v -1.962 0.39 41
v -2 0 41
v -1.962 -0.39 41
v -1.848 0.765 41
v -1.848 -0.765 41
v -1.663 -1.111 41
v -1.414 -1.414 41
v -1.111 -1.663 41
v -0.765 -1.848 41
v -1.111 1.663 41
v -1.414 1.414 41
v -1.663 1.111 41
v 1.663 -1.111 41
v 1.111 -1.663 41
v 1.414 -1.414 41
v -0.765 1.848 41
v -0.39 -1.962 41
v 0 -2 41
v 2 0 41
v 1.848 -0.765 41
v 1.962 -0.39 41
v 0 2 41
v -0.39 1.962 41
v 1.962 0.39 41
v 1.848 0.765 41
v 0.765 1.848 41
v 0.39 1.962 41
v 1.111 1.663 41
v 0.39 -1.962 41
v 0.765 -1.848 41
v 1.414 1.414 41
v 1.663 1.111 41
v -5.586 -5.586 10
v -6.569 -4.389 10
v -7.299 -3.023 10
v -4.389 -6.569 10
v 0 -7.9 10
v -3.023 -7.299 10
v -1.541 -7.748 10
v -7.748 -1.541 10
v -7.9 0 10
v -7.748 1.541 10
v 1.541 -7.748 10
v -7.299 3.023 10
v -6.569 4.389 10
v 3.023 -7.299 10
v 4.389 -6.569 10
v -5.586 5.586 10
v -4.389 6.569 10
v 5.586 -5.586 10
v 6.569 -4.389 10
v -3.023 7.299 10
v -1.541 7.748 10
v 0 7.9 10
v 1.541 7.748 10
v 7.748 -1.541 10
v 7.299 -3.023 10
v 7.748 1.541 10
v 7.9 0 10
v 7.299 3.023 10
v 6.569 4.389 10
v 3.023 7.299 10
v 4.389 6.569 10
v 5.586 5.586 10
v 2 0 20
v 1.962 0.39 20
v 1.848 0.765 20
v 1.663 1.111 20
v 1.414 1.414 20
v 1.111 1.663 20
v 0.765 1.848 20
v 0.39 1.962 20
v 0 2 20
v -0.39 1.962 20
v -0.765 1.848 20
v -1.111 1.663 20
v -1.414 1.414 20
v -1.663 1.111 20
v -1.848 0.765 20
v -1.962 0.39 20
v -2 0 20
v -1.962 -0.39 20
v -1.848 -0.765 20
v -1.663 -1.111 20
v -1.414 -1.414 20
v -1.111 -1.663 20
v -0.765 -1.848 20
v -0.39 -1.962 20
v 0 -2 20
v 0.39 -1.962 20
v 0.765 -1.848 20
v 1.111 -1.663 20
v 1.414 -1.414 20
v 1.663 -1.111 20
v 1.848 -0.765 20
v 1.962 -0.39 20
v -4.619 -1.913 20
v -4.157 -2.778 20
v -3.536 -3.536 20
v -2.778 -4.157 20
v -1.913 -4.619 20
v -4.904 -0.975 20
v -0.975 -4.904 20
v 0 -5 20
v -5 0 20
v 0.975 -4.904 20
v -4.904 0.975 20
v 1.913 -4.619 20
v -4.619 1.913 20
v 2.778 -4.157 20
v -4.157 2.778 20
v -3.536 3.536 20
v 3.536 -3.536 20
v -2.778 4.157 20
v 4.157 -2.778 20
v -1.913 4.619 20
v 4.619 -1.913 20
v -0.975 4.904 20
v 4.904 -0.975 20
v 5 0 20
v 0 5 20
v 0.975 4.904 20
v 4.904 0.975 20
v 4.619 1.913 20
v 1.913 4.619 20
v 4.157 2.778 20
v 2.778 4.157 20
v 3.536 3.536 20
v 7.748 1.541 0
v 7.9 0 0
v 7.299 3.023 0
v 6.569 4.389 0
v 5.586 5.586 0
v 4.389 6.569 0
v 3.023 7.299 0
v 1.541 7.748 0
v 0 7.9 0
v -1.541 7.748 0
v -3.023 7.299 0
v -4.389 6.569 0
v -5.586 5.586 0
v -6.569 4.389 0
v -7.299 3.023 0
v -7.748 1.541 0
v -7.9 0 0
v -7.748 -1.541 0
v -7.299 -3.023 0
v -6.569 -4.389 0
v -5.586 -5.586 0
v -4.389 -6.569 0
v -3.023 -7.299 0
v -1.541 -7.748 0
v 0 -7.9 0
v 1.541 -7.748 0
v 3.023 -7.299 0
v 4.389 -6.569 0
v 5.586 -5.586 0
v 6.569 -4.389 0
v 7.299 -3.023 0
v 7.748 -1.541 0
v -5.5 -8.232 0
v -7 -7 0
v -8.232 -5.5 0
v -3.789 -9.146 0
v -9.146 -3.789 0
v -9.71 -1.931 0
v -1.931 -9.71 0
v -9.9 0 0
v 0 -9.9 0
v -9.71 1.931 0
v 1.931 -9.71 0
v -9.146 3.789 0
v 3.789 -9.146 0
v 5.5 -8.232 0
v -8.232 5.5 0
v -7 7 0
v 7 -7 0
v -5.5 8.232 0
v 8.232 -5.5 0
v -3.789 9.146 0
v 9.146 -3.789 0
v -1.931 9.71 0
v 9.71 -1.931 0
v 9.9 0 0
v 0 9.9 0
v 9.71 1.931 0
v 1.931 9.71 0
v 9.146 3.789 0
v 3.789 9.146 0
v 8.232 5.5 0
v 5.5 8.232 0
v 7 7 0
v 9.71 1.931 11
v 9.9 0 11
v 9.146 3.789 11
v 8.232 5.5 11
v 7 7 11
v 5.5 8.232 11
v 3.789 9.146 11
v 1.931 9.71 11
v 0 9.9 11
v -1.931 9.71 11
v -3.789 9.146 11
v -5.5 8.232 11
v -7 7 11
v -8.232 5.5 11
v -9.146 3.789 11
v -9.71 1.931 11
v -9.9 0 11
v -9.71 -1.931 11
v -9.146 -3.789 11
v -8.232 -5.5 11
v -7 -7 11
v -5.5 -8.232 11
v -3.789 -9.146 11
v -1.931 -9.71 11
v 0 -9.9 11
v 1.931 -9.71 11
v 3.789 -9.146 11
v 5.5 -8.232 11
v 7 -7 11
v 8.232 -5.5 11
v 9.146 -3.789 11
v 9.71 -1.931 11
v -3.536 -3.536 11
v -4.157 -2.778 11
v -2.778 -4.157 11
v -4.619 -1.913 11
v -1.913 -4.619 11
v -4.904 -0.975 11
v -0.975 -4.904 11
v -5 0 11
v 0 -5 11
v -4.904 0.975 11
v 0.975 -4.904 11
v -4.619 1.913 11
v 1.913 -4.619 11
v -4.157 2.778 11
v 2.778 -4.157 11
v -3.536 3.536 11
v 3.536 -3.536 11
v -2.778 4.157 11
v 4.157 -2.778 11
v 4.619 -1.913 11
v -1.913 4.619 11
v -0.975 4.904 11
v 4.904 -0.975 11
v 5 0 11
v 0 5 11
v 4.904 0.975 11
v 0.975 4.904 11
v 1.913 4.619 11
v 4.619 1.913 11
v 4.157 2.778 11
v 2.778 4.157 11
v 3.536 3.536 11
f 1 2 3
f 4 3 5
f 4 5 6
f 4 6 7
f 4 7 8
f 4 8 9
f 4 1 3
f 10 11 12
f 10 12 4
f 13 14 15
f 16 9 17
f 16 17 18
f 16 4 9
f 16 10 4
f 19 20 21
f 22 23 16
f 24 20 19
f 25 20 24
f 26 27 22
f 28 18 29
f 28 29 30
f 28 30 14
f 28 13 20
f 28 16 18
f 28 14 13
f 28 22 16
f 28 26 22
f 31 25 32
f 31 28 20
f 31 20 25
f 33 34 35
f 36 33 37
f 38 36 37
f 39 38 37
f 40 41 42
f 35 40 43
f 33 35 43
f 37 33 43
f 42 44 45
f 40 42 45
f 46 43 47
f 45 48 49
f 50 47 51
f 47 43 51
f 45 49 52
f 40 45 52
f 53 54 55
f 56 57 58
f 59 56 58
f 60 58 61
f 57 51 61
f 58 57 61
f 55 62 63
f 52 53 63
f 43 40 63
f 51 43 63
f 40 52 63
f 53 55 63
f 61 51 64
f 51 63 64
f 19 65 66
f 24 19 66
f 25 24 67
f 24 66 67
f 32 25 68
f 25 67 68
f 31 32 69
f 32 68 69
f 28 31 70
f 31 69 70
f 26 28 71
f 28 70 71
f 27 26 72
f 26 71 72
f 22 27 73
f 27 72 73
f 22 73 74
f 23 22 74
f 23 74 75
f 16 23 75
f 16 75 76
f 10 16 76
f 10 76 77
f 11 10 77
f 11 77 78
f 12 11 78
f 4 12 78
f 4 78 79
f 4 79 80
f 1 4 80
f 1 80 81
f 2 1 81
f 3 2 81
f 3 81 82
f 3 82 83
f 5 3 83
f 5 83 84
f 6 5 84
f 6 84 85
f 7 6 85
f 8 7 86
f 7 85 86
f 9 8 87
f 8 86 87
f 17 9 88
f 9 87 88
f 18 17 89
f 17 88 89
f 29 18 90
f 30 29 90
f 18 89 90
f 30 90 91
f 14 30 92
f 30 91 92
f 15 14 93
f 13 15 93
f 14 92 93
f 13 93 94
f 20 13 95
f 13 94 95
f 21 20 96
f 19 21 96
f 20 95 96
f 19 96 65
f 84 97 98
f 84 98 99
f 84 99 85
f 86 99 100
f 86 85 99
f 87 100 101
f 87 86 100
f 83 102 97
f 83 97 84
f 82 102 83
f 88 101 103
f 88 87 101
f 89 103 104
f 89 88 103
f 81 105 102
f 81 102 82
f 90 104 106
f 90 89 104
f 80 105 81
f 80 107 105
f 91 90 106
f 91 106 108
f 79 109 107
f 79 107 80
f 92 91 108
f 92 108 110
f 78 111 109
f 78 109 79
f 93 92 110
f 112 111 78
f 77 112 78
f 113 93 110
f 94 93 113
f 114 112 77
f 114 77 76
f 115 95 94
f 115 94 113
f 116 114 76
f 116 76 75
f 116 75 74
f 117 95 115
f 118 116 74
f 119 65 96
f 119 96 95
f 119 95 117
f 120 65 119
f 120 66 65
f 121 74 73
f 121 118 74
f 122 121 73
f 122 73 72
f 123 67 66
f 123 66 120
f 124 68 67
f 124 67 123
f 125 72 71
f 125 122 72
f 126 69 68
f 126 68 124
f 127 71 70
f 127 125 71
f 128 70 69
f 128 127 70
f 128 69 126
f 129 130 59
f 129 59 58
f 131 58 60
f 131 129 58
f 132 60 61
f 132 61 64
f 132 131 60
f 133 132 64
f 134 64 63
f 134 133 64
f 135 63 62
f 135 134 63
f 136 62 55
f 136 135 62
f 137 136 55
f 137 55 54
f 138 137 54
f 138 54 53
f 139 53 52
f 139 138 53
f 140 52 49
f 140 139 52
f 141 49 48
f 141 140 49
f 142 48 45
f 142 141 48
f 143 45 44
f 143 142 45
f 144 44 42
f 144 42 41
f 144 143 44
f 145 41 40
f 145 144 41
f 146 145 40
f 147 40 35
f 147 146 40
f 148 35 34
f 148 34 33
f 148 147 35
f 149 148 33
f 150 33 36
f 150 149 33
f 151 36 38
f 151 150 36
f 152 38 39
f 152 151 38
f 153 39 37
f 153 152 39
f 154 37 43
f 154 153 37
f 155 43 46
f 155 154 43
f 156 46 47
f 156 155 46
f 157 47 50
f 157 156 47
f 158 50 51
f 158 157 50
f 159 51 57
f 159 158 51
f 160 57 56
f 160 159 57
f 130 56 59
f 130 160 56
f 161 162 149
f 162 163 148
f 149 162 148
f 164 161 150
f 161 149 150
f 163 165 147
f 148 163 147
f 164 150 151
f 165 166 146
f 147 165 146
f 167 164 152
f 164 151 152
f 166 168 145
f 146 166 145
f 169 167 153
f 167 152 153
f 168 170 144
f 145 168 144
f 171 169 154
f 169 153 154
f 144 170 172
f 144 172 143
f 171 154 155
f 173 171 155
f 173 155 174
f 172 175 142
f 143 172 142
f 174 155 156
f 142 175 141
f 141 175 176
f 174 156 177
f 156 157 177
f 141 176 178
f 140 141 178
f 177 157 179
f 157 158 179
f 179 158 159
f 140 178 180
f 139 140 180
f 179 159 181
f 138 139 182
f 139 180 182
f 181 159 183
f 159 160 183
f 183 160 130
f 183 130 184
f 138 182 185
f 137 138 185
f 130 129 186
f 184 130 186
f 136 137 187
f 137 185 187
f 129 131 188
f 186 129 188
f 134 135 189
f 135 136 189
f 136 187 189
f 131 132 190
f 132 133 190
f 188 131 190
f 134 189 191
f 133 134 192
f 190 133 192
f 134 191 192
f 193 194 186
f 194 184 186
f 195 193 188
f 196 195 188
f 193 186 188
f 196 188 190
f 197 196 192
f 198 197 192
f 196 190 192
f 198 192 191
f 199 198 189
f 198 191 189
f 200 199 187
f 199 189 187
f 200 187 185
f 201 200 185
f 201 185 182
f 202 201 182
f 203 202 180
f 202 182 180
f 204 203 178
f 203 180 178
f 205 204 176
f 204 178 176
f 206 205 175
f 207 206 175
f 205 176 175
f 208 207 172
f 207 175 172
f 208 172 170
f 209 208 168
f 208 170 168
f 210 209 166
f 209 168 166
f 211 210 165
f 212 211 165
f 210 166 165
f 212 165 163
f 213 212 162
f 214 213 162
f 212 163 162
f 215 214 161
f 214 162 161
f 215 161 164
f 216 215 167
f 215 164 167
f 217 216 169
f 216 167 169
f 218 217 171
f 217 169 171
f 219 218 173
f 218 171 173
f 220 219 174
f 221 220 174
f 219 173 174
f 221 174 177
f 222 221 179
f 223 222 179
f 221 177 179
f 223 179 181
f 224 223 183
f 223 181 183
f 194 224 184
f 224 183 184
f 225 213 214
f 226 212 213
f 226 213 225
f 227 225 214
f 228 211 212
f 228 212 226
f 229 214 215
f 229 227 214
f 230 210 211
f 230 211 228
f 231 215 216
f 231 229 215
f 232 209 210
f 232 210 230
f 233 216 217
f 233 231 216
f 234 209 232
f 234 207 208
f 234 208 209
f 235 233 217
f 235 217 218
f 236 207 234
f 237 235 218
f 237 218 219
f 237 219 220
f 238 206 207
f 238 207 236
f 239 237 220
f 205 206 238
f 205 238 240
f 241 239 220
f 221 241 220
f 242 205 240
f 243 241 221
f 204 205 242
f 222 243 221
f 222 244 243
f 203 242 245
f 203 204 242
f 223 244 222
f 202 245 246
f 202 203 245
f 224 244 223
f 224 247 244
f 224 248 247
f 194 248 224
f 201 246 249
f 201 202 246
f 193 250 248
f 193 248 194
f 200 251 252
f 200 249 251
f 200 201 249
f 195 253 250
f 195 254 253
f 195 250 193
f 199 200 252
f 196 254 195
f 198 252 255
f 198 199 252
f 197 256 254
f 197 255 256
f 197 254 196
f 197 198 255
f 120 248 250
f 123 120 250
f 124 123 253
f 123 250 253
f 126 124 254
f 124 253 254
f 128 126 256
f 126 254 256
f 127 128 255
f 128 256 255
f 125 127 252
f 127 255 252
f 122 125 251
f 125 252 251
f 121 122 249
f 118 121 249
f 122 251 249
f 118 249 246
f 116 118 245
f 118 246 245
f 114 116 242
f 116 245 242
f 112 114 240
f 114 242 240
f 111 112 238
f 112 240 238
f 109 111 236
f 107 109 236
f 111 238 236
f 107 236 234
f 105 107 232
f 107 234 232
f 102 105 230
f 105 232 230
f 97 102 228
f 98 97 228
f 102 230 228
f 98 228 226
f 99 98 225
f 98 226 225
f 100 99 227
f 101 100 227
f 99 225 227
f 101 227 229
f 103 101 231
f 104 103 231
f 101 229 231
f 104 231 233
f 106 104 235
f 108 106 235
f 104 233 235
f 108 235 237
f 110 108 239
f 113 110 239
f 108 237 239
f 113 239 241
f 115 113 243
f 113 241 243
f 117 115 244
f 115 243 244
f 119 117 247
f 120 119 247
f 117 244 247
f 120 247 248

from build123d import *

# Parameters (mm, degrees)
CROQUIS1_R              = 9.9
CROQUIS1_R_2            = 7.9
SALIENTE_EXTRUIR1_DEPTH = 10
CROQUIS2_R              = 9.9
SALIENTE_EXTRUIR2_DEPTH = 1
CROQUIS4_R              = 5
SALIENTE_EXTRUIR4_DEPTH = 9
CROQUIS3_R              = 2
SALIENTE_EXTRUIR3_DEPTH = 30


with BuildPart() as part:
    # Croquis1 → Saliente-Extruir1 (new body)
    with BuildSketch(Plane.XY):
        Circle(CROQUIS1_R)
        Circle(CROQUIS1_R_2, mode=Mode.SUBTRACT)
    extrude(amount=SALIENTE_EXTRUIR1_DEPTH)

    # Croquis2 → Saliente-Extruir2 (add)
    with BuildSketch(Plane.XY.offset(10)):
        Circle(CROQUIS2_R)
    extrude(amount=SALIENTE_EXTRUIR2_DEPTH)

    # Croquis4 → Saliente-Extruir4 (add)
    with BuildSketch(Plane.XY.offset(11)):
        Circle(CROQUIS4_R)
    extrude(amount=SALIENTE_EXTRUIR4_DEPTH)

    # Croquis3 → Saliente-Extruir3 (add)
    with BuildSketch(Plane.XY.offset(11)):
        Circle(CROQUIS3_R)
    extrude(amount=SALIENTE_EXTRUIR3_DEPTH)


solid = part.part
